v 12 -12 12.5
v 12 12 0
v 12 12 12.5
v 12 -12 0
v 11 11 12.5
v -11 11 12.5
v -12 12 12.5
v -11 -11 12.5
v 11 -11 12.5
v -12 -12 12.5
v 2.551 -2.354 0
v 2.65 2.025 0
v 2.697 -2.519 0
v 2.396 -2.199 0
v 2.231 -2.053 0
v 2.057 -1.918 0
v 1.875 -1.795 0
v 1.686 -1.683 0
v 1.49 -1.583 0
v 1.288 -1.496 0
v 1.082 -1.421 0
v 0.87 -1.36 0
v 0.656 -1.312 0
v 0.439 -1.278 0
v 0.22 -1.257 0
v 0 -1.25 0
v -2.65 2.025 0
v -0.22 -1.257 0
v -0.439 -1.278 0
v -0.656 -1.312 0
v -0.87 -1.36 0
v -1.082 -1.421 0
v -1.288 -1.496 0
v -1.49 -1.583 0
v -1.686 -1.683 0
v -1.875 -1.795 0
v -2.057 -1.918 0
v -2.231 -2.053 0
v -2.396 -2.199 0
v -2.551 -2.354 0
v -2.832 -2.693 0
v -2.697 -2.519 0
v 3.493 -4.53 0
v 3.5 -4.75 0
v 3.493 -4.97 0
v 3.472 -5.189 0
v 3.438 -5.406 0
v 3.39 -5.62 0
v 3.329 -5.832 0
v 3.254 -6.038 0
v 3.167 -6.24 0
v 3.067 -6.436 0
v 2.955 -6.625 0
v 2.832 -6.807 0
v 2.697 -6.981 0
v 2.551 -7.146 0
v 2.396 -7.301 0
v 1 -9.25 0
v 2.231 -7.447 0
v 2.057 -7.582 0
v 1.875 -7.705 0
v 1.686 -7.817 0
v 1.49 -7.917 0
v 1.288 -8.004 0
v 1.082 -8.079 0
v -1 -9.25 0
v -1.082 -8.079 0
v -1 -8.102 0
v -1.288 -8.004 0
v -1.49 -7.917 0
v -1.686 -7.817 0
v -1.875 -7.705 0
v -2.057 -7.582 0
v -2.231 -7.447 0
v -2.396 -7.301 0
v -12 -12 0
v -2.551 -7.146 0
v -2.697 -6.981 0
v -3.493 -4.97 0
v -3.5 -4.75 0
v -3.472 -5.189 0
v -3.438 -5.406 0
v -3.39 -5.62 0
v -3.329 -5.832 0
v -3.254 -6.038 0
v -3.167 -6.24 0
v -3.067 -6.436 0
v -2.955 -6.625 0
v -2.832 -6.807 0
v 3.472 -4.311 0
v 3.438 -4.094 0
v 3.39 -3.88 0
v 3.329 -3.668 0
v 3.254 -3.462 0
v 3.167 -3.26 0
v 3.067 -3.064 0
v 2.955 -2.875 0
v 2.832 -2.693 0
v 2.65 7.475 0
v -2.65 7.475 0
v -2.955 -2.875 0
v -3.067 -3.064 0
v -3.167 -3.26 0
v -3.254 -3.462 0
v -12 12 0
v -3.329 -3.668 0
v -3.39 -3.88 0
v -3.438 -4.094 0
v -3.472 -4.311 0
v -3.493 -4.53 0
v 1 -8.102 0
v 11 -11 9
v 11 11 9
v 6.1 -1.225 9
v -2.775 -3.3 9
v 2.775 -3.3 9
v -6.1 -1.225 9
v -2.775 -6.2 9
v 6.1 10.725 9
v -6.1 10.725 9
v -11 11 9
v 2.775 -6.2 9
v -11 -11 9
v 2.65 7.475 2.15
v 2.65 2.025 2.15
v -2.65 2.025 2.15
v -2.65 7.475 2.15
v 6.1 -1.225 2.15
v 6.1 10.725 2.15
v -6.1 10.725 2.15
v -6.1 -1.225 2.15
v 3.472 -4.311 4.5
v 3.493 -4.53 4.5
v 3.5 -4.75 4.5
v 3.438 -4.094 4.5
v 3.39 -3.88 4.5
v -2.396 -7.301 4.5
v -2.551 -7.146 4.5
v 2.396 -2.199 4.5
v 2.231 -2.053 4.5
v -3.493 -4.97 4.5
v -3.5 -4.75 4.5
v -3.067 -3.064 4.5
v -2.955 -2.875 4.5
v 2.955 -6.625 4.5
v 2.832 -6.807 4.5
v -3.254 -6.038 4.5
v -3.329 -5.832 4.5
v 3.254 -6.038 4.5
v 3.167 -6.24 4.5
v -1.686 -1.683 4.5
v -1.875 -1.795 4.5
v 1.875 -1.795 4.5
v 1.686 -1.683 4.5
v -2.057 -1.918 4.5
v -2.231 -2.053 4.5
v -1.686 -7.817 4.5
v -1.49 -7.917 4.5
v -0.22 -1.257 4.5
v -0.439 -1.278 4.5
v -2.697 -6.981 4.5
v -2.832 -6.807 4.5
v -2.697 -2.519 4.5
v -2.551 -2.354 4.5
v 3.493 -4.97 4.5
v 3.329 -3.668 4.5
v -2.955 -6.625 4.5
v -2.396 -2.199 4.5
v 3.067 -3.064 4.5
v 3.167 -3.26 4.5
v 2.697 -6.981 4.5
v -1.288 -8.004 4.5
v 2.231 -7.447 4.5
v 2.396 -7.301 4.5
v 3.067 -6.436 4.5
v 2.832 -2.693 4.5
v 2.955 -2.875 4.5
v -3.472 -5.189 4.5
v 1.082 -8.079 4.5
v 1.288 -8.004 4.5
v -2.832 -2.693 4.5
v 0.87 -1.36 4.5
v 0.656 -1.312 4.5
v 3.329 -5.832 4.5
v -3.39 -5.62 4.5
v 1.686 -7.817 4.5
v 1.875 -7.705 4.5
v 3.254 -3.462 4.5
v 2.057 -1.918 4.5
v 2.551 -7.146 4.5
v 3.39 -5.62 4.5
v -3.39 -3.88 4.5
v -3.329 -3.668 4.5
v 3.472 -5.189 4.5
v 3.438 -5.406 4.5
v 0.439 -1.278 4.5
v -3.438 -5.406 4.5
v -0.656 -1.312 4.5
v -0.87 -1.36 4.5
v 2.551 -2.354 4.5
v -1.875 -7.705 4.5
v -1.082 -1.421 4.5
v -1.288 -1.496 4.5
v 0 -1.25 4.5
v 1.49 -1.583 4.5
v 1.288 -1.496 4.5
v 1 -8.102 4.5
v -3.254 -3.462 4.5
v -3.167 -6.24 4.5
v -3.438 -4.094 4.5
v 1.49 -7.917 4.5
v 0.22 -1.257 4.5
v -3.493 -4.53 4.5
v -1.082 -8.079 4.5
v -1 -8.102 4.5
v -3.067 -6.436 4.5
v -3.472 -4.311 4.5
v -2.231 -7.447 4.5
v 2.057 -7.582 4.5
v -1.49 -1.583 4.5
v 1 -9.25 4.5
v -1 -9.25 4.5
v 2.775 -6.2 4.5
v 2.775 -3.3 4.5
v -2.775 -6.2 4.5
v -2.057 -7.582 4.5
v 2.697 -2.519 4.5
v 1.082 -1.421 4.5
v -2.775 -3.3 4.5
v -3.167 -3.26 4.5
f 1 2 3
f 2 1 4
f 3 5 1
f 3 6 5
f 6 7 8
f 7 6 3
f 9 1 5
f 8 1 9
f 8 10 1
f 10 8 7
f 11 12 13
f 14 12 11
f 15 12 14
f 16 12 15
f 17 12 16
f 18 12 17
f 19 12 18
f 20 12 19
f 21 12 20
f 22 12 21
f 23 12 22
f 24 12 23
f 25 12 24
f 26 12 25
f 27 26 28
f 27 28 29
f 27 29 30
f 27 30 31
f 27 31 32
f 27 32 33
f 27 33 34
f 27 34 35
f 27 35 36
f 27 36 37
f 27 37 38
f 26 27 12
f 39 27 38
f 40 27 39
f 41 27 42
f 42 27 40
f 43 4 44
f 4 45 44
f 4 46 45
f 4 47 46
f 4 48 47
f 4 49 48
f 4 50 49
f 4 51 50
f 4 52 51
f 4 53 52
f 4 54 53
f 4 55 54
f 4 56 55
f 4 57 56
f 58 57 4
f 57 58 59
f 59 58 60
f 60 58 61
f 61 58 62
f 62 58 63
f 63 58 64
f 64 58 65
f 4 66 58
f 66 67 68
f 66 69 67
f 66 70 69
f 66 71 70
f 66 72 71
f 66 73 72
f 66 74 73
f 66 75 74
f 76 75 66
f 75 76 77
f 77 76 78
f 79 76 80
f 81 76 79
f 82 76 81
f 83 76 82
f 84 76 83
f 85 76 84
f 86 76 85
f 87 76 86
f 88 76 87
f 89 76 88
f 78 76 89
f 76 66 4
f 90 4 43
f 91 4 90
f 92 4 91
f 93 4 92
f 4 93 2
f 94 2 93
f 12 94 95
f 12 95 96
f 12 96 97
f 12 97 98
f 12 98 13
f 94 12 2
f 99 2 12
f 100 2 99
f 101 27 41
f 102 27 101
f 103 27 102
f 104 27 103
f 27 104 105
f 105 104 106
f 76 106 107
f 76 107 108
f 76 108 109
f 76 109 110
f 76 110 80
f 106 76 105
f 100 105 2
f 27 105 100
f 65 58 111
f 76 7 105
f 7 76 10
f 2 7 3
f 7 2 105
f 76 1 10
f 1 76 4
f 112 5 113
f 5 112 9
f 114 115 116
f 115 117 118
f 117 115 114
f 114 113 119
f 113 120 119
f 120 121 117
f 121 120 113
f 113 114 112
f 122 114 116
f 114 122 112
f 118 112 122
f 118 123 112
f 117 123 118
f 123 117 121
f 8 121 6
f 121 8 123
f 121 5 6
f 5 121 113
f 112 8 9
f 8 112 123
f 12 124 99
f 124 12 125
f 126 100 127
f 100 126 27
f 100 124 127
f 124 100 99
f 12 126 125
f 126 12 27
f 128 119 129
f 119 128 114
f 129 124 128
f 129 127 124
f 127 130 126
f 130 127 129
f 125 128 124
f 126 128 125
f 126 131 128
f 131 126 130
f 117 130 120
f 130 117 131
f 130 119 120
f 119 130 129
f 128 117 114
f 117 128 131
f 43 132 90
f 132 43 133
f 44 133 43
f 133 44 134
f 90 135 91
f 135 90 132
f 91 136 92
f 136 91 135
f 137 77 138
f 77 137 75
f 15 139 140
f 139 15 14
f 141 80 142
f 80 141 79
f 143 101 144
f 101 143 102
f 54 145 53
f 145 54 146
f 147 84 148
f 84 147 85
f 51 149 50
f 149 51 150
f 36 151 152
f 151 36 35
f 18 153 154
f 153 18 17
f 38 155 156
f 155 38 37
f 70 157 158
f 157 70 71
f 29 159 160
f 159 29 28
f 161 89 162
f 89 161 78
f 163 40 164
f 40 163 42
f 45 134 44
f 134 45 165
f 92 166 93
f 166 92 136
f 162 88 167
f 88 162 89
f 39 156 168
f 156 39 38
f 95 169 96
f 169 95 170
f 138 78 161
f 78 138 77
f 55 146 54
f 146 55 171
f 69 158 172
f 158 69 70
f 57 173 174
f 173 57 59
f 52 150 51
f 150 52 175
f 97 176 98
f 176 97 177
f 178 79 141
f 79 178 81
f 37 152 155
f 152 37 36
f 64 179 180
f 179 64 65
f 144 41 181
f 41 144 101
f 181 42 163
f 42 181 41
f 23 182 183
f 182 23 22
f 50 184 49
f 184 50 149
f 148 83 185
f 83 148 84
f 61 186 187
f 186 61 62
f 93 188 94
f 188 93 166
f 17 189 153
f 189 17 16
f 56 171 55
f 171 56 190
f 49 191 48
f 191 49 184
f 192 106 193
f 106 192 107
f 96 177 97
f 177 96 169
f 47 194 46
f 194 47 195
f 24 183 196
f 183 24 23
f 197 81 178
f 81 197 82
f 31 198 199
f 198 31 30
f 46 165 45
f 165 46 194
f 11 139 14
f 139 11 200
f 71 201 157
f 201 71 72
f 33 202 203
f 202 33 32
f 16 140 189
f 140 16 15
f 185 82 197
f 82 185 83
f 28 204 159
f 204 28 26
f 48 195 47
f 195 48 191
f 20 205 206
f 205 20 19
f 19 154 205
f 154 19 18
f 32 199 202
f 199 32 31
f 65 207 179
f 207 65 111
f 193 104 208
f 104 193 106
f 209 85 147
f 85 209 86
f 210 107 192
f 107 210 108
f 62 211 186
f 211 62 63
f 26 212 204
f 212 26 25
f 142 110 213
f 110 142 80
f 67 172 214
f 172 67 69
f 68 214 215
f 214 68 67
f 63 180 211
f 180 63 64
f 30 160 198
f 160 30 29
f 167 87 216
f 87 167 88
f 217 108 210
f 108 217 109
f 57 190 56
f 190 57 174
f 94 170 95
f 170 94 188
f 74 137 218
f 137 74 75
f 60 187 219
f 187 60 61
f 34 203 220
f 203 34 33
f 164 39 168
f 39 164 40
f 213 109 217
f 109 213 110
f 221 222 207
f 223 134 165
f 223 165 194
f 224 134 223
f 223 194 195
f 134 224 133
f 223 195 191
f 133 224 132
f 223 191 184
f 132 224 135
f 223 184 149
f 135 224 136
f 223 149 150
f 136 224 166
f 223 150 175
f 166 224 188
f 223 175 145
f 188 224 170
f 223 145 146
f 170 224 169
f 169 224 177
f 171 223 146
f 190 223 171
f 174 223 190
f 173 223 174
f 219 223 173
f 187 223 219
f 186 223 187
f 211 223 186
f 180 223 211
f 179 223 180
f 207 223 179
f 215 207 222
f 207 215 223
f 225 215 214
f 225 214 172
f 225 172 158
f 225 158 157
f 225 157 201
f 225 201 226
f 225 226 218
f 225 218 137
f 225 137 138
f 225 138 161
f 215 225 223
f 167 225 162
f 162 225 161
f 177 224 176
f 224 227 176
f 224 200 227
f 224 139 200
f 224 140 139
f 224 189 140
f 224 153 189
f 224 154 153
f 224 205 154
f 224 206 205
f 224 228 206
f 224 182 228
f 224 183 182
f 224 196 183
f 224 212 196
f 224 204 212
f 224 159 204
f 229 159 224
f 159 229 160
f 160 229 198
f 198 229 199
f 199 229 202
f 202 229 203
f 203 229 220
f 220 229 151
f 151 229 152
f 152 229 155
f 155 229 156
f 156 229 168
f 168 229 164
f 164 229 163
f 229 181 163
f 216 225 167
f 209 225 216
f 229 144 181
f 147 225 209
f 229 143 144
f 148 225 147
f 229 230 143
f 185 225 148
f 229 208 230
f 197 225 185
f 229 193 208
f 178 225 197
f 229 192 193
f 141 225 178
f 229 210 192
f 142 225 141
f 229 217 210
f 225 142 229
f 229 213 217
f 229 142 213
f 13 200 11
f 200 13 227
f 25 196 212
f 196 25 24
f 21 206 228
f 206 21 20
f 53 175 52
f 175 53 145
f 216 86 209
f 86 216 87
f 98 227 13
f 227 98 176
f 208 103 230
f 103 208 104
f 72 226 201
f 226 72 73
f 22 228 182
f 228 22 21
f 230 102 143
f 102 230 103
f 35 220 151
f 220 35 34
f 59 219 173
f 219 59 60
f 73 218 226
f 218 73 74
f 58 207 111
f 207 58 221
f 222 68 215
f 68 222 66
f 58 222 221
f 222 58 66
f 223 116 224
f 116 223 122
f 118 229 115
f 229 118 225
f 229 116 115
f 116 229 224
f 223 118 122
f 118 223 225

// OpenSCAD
$fn = 100;


difference(){
shell();
translate([0,9.5/2,0]){
	sensor();
}
translate([0,-9.5/2,0]){
	LED();
}
translate([0,-9.5/2,0]){	
	LED_mount();
}
}
//cap();


module sensor(){
translate([0,0,3]){
	union(){
		translate([0,0,-3.2/2]){
		cube([5.3,5.45,20],center=true);
		}
		translate([0,0,10-1.7/2]){
		cube([12.2,11.95,20],center=true);
		}
	}
}
}

module LED(){
translate([0,0,2]){
	union(){
		cylinder(h=5,r=7/2,center=true);
		translate([0,-3.5,0]){
		cube([2,2,5],center=true);
		}
	}
}
}

module LED_mount(){
translate([0,0,10+7.5/2]){
	cube([5.55,2.9,20],center=true);
}
}

module cap(){
difference(){
	union(){
		cube([24,24,1],center=true);
		translate([0,0,1]){
			cube([21.5,21.5,2],center=true);
		}
	}
	translate([0,-9.5/2,0]){
		cylinder(h=10,r=7/2,center=true);
	}
	translate([0,9.5/2,0]){
		cylinder(h=10,r=2,center=true);
	}
}
}

module shell(){
translate([0,0,12.5]){
	difference(){
		translate([0,0,-6.25]){	
			cube([24,24,12.5],center=true);
		}
		translate([0,0,6.5]){
			cube([22,22,20],center=true);
		}
		//cylinder(h=40,r=8.5,center=true);
	}
}
}
